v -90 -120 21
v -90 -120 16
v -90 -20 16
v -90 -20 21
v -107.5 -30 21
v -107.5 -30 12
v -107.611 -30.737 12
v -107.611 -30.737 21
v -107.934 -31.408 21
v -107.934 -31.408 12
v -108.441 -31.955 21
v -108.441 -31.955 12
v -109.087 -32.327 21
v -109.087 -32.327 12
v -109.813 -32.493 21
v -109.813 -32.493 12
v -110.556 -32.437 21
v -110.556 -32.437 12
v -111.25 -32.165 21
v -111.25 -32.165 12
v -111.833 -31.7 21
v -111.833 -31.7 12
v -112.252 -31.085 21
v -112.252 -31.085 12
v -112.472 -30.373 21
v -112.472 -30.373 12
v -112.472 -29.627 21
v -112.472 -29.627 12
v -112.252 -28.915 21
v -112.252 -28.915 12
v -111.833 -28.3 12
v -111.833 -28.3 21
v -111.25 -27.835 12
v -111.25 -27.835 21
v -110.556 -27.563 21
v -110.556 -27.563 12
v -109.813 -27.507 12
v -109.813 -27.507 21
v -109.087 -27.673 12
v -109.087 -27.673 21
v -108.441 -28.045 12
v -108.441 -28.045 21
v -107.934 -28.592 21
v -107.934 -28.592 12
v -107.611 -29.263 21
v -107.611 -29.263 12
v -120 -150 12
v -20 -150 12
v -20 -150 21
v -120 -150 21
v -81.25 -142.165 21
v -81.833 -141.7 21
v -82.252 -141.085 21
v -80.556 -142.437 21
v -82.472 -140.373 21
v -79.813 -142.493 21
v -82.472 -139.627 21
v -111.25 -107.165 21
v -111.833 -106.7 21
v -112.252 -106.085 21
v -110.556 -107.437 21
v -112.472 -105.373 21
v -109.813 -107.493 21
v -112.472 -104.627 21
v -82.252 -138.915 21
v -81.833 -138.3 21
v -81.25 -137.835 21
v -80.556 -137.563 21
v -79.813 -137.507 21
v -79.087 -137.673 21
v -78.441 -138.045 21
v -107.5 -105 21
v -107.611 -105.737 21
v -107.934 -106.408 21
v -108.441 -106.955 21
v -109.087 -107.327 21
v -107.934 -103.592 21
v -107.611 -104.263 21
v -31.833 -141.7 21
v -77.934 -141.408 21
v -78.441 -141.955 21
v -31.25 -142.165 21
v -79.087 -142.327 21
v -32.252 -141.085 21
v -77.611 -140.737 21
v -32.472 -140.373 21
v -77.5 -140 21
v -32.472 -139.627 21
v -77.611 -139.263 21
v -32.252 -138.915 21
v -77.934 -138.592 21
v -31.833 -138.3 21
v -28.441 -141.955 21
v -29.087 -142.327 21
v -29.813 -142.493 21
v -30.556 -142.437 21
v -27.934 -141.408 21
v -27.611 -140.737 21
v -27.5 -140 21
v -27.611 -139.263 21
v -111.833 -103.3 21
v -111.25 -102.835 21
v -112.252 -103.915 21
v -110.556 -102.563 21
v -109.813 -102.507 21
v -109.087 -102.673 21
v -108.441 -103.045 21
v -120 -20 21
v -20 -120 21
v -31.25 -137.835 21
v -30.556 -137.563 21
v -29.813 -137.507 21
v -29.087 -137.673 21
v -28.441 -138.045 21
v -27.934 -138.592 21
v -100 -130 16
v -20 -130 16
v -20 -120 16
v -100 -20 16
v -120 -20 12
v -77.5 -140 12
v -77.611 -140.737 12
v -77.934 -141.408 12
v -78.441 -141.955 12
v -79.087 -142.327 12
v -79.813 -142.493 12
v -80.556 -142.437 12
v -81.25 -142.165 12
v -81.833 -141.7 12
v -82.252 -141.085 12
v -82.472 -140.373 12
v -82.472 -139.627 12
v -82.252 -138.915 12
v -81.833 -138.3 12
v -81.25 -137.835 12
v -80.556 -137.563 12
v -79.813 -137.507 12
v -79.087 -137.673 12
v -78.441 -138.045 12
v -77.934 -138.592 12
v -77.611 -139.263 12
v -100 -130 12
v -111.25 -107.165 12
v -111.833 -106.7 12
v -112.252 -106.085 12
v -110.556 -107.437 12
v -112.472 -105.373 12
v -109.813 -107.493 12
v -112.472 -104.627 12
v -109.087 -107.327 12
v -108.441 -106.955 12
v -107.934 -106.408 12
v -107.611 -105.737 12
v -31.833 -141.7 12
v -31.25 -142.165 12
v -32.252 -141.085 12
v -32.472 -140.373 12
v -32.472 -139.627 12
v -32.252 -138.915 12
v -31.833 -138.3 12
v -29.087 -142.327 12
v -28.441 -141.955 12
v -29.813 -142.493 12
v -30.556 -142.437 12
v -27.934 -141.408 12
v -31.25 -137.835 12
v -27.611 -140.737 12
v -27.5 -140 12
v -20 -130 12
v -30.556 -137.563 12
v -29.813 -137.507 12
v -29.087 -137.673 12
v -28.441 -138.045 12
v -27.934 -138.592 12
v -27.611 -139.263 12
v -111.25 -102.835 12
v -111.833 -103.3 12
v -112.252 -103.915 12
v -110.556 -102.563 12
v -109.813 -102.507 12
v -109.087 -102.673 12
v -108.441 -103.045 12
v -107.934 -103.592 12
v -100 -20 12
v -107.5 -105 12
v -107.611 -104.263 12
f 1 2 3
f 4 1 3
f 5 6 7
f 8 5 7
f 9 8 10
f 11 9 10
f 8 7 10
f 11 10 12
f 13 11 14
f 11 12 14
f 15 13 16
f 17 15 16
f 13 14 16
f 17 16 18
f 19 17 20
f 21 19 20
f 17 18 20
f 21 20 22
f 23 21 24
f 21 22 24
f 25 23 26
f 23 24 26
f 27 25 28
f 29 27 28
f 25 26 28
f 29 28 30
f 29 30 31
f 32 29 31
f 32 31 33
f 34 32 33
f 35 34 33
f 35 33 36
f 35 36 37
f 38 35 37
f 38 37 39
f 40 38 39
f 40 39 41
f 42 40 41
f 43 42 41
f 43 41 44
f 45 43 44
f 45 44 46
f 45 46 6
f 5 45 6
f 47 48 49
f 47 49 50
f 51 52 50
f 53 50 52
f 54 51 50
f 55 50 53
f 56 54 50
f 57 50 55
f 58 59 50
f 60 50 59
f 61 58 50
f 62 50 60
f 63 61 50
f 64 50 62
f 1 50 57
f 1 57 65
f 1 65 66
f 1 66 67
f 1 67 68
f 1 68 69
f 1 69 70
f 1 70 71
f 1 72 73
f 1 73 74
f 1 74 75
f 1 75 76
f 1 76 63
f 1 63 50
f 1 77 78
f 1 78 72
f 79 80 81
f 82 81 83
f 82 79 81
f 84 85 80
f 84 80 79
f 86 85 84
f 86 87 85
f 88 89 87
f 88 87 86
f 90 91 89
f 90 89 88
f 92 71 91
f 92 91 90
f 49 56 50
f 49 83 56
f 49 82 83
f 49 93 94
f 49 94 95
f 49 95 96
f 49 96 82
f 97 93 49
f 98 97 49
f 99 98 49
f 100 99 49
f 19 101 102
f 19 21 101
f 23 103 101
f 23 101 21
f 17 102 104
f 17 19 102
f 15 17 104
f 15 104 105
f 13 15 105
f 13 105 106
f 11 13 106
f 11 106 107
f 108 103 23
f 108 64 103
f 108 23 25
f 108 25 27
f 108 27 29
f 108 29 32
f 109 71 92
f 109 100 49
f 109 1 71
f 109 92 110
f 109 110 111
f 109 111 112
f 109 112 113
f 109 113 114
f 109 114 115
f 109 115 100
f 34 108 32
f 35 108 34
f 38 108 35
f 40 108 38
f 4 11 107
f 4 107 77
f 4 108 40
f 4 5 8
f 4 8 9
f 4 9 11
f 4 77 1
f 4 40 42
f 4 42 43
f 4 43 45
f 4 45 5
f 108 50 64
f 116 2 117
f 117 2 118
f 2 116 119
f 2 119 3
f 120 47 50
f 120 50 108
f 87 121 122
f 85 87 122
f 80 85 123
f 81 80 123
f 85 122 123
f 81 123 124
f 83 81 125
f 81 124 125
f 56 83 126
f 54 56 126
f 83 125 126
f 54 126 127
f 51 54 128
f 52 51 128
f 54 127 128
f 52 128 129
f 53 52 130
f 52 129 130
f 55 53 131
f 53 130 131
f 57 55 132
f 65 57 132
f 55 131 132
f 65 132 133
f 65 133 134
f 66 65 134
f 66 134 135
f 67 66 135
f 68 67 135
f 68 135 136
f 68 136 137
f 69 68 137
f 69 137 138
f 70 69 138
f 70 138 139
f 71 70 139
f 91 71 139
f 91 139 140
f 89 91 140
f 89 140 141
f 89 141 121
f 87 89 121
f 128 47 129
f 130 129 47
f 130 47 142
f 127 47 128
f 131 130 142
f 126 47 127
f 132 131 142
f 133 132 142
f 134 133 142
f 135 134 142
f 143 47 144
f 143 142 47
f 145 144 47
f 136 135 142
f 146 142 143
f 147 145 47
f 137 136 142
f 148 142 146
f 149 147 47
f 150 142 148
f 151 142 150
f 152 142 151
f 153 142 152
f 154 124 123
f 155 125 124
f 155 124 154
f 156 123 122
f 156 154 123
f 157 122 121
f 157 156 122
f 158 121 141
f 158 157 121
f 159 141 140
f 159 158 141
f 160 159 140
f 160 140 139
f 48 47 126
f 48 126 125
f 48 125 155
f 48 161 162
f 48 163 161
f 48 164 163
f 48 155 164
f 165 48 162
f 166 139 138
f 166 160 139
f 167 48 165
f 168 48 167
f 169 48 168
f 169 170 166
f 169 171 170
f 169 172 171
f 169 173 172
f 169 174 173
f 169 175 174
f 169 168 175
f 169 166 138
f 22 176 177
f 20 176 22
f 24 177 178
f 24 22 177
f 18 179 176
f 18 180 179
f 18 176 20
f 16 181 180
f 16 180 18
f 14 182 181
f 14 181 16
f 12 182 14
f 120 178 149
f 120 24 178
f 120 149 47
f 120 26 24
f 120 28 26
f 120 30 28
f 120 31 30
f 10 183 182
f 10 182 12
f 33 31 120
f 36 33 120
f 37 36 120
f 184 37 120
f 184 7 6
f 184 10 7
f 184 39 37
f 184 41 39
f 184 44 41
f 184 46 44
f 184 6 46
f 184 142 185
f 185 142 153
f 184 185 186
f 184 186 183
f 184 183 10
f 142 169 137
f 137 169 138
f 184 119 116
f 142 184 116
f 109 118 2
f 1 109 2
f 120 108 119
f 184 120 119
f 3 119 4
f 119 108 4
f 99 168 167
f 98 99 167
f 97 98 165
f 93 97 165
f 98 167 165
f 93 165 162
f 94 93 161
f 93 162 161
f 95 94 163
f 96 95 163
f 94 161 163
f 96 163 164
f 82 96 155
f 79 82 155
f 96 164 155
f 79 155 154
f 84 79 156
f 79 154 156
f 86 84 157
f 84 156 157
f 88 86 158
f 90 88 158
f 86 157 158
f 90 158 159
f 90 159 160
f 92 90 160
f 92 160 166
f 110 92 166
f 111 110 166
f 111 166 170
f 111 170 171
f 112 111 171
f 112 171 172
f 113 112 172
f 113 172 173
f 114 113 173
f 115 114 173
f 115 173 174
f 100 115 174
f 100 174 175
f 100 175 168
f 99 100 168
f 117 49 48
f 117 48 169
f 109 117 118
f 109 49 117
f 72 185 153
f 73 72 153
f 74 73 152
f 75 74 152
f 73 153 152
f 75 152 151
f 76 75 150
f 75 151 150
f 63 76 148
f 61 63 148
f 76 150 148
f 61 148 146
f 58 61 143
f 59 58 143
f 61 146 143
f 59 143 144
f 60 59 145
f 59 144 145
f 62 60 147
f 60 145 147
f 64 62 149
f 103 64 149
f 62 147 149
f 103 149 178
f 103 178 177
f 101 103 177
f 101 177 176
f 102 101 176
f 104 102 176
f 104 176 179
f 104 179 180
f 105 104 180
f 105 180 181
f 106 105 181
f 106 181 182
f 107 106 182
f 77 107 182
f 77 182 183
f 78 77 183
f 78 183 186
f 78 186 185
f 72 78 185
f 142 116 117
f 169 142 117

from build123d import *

# Parameters (mm, degrees)
F1_DEPTH  = 12
F2_W      = 100
F2_H      = 20
F3_DEPTH  = 5
F4_W      = 135
F4_H      = 20
F5_DEPTH  = 5
F7_R      = 2.5
F8_DEPTH  = 25
F9_DEPTH  = 5
F10_W     = 20
F10_H     = 20
F10_W_2   = 100
F10_H_2   = 130
F11_DEPTH = 25
F12_W     = 130
F12_H     = 16
F13_DEPTH = 100.0010001


with BuildPart() as f1:
    # F0 (on Top) → F1 (new body)
    with BuildSketch(Plane.XY):
        with BuildLine():
            add(Edge.make_bspline(
                [(-86.5, 0), (-86.5, -116.5), (0, -116.5)],
                knots=[1.5707963268, 1.5707963268, 1.5707963268, 3.1415926536, 3.1415926536, 3.1415926536], degree=2, weights=[1, 0.7071067812, 1]))
            Line((-86.5, 0), (-86.5, -116.5))
            Line((-86.5, -116.5), (0, -116.5))
        make_face()
        Polygon((-86.5, -116.5), (-86.5, 0), (-100, 0), (-100, -130), (0, -130), (0, -116.5), align=None)
    extrude(amount=F1_DEPTH)

    # F2 (on face) → F3 (join)
    with BuildSketch(Plane.XZ.offset(130)):
        with Locations((-50, 6)):
            Rectangle(F2_W, F2_H)
    extrude(amount=F3_DEPTH)

    # F4 (on face) → F5 (join)
    with BuildSketch(Plane(origin=(-100, 0, 0), x_dir=(0, -1, 0), z_dir=(-1, 0, 0))):
        with Locations((67.5, 6)):
            Rectangle(F4_W, F4_H)
    extrude(amount=F5_DEPTH)

    # F7 (on face) → F8 (join)
    with BuildSketch(Plane(origin=(0, 0, -4), x_dir=(1, 0, 0), z_dir=(0, 0, -1))):
        Polygon((0, 135), (0, 150), (-120, 150), (-120, 0), (-105, 0), (-105, 135), align=None)
        with Locations((-110, 30)):
            Circle(F7_R, mode=Mode.SUBTRACT)
        with Locations((-110, 105)):
            Circle(F7_R, mode=Mode.SUBTRACT)
        with Locations((-80, 140)):
            Circle(F7_R, mode=Mode.SUBTRACT)
        with Locations((-30, 140)):
            Circle(F7_R, mode=Mode.SUBTRACT)
    extrude(amount=-F8_DEPTH)

    # F6 (on face) → F9 (join)
    with BuildSketch(Plane.XY.offset(16)):
        Polygon((-90, 0), (-105, 0), (-105, -135), (0, -135), (0, -120), (-90, -120), align=None)
    extrude(amount=F9_DEPTH)

    # F10 (on Top) → F11 (cut, symmetric)
    with BuildSketch(Plane.XY):
        with Locations((-10, -10)):
            Rectangle(F10_W, F10_H)
        with Locations((-70, -10)):
            Rectangle(F10_W_2, F10_H)
        with Locations((-10, -85)):
            Rectangle(F10_W, F10_H_2)
    extrude(amount=F11_DEPTH, both=True, mode=Mode.SUBTRACT)

    # F12 (on face) → F13 (cut, through all)
    with BuildSketch(Plane.YZ.offset(-20)):
        with Locations((-85, 4)):
            Rectangle(F12_W, F12_H)
    extrude(amount=-F13_DEPTH, mode=Mode.SUBTRACT)


solid = f1.part
